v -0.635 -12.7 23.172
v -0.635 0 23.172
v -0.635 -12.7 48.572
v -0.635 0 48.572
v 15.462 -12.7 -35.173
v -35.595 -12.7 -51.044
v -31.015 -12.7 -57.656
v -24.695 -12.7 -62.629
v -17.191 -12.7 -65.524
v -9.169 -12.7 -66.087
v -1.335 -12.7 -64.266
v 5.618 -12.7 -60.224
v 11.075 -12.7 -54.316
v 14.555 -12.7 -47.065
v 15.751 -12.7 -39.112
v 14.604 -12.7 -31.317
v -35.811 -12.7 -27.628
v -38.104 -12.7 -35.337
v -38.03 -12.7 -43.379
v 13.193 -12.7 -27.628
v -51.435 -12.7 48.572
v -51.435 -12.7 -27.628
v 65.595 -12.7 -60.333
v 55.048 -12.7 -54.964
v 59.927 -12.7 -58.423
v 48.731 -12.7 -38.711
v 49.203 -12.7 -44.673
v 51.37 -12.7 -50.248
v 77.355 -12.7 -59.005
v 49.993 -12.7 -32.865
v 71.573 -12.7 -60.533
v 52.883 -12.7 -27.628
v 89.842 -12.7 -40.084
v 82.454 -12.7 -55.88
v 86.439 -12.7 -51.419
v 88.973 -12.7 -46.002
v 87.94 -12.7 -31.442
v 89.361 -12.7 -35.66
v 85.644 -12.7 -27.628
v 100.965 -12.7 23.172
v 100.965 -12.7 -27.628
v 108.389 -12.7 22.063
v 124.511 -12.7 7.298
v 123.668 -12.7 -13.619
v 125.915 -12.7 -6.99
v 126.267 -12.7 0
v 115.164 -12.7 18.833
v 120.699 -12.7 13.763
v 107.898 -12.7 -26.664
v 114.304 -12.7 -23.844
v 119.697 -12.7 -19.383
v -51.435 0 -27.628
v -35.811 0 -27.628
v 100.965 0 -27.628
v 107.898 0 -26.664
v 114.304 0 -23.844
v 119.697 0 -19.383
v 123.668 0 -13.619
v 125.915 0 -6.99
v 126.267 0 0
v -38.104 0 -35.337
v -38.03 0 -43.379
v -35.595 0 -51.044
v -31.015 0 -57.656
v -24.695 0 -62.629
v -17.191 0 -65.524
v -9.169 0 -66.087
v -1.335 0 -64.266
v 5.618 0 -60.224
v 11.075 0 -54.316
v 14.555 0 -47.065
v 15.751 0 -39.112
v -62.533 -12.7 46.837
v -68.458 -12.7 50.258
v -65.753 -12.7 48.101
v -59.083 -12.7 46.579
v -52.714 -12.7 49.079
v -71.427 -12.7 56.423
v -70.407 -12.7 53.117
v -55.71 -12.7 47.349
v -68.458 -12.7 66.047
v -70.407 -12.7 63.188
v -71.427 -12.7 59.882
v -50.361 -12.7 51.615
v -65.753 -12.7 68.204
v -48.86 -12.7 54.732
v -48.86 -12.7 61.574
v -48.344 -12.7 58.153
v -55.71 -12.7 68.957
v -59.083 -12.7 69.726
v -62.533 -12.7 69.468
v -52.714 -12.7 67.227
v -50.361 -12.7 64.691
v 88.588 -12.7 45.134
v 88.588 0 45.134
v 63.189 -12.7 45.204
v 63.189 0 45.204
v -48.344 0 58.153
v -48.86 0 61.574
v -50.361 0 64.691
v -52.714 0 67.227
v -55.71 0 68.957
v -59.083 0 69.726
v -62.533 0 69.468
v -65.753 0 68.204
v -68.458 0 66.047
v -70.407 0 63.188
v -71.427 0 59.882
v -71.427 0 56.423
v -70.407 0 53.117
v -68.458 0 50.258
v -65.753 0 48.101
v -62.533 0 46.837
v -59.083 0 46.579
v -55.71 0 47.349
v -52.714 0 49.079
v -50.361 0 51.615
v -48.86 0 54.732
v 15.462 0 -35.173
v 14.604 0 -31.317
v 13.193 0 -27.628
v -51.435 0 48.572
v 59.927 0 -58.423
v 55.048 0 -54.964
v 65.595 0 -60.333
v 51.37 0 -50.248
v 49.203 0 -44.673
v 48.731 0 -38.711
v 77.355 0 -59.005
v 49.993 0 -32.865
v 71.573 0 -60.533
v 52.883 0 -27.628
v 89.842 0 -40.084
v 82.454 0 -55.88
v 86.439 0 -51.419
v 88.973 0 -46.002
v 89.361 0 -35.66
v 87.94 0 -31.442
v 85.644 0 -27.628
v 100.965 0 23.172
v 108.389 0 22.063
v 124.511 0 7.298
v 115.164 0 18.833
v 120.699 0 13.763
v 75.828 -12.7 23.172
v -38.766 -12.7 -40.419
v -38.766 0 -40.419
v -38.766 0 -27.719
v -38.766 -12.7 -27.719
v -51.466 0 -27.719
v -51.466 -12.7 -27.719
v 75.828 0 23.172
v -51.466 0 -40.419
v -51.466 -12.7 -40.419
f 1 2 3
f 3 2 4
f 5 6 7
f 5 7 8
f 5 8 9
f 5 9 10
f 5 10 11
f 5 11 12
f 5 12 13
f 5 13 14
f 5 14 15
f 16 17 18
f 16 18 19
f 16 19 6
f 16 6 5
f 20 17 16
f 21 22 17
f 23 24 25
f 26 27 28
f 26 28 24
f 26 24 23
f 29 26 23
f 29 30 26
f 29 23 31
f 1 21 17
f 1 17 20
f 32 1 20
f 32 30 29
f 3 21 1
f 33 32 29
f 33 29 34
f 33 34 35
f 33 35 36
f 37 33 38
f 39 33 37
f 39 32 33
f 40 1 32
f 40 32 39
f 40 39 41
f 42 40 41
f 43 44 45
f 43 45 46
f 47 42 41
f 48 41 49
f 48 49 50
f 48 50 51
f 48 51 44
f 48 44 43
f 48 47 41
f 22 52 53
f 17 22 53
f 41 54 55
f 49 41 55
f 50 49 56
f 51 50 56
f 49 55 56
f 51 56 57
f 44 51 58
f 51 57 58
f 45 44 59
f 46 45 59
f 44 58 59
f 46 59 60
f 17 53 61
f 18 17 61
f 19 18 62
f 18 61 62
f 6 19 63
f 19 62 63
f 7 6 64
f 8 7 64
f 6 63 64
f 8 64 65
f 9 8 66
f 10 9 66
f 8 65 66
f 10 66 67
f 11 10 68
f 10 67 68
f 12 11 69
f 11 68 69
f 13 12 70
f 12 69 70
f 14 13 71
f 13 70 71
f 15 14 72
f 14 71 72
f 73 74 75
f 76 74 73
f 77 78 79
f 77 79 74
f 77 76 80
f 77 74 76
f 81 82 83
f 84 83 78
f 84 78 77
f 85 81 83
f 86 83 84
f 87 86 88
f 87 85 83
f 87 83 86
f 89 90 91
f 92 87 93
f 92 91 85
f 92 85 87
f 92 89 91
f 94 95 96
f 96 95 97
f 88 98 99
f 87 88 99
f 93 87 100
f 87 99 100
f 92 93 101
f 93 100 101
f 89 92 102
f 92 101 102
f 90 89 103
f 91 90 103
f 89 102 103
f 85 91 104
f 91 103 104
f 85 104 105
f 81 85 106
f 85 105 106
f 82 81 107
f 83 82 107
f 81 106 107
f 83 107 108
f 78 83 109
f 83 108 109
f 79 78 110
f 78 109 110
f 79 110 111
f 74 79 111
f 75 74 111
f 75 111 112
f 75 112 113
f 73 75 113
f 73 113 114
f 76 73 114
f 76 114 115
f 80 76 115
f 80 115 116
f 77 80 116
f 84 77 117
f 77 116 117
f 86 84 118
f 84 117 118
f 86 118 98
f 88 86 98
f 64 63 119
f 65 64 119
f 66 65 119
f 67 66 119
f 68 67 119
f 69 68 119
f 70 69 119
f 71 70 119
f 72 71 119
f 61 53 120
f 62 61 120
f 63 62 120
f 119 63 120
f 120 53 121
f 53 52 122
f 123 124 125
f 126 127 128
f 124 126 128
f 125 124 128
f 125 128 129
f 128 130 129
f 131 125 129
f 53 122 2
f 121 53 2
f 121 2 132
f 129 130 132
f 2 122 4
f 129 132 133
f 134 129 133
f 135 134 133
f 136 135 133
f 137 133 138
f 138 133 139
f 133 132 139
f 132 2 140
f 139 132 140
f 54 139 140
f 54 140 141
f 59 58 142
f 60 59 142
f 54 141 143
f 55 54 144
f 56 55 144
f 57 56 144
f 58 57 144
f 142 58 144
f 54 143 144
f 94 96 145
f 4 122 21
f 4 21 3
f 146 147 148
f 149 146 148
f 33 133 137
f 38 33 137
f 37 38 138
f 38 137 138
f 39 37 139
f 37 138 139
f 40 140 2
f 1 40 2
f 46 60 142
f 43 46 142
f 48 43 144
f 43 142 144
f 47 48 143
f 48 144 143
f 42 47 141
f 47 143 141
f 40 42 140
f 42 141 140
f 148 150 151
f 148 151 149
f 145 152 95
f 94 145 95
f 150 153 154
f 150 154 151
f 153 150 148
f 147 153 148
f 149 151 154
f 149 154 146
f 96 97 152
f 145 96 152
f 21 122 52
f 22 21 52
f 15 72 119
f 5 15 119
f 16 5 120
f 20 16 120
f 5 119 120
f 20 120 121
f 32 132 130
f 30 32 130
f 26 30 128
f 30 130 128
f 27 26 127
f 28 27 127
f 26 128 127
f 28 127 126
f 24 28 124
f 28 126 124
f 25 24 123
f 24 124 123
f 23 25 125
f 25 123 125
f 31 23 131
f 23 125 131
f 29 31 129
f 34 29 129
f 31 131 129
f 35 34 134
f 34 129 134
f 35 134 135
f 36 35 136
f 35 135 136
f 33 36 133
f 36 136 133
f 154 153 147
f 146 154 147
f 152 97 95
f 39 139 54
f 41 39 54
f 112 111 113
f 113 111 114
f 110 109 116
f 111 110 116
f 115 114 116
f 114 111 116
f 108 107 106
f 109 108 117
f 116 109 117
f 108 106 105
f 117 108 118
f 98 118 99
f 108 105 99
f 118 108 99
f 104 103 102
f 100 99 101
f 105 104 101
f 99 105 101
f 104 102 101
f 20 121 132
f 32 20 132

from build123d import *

# Parameters (mm, degrees)
F1_W     = 50.8
F1_H     = 25.4
F2_DEPTH = 12.7
F1_W_2   = 12.7
F1_H_2   = 12.7
F0_R     = 11.6061953028


with BuildPart() as f2:
    # F1 (on Front) → F2 (new body)
    with BuildSketch(Plane.XZ):
        with Locations((-26.0346938372, 35.8717816622)):
            Rectangle(F1_W, F1_H)
        with BuildLine():
            Line((-0.6346938372, 23.1717816622), (-51.4346938372, 23.1717816622))
            Line((-51.4346938372, 23.1717816622), (-51.4346938372, -27.6282183378))
            Line((-51.4346938372, -27.6282183378), (-35.8106568949, -27.6282183378))
            ThreePointArc((-35.8106568949, -27.6282183378), (-11.3088339567, -12.0524939981), (13.1929889814, -27.6282183378))
            Line((13.1929889814, -27.6282183378), (52.8828968769, -27.6282183378))
            ThreePointArc((52.8828968769, -27.6282183378), (69.2636594176, -19.5055942382), (85.6444219583, -27.6282183378))
            Line((85.6444219583, -27.6282183378), (100.9653061628, -27.6282183378))
            Line((100.9653061628, -27.6282183378), (100.9653061628, 23.1717816622))
            Line((100.9653061628, 23.1717816622), (75.827864427, 23.1717816622))
            Line((75.827864427, 23.1717816622), (-0.6346938372, 23.1717816622))
        make_face()
        with BuildLine():
            ThreePointArc((13.1929889814, -27.6282183378), (-11.3088339567, -12.0524939981), (-35.8106568949, -27.6282183378))
            Line((-35.8106568949, -27.6282183378), (-11.3088339567, -27.6282183378))
            Line((-11.3088339567, -27.6282183378), (13.1929889814, -27.6282183378))
        make_face()
        with BuildLine():
            Line((-11.3088339567, -27.6282183378), (-35.8106568949, -27.6282183378))
            ThreePointArc((-35.8106568949, -27.6282183378), (-17.1914081512, -65.5243298477), (15.7506625268, -39.1119904816))
            ThreePointArc((15.7506625268, -39.1119904816), (15.1035054093, -33.2294162871), (13.1929889814, -27.6282183378))
            Line((13.1929889814, -27.6282183378), (-11.3088339567, -27.6282183378))
        make_face()
        with BuildLine():
            ThreePointArc((126.2673820271, 0), (118.1199448098, 16.5035293887), (100.9653061628, 23.1717816622))
            Line((100.9653061628, 23.1717816622), (100.9653061628, -27.6282183378))
            ThreePointArc((100.9653061628, -27.6282183378), (119.6970538894, -19.3828569848), (126.2673820271, 0))
        make_face()
        with BuildLine():
            ThreePointArc((85.6444219583, -27.6282183378), (69.2636594176, -19.5055942382), (52.8828968769, -27.6282183378))
            Line((52.8828968769, -27.6282183378), (85.6444219583, -27.6282183378))
        make_face()
        with BuildLine():
            Line((85.6444219583, -27.6282183378), (52.8828968769, -27.6282183378))
            ThreePointArc((52.8828968769, -27.6282183378), (62.6914232933, -59.5853239072), (89.8423787807, -40.0843136013))
            ThreePointArc((89.8423787807, -40.0843136013), (88.7646697236, -33.512077477), (85.6444219583, -27.6282183378))
        make_face()
    extrude(amount=F2_DEPTH)


with BuildPart() as f2b:
    # F1 (on Front) → F2, piece 2 (new body)
    with BuildSketch(Plane.XZ):
        Polygon((63.1885279137, 45.2037396438), (75.827864427, 23.1717816622), (88.5884314775, 45.1337471604), align=None)
    extrude(amount=F2_DEPTH)


with BuildPart() as f2c:
    # F1 (on Front) → F2, piece 3 (new body)
    with BuildSketch(Plane.XZ):
        with Locations((-45.11574229, -34.0687217355)):
            Rectangle(F1_W_2, F1_H_2)
    extrude(amount=F2_DEPTH)


with BuildPart() as f2d:
    # F0 (on Front) → F2, piece 4 (new body)
    with BuildSketch(Plane.XZ):
        with Locations((-59.9503405392, 58.1526570022)):
            Circle(F0_R)
    extrude(amount=F2_DEPTH)


solid = Compound([f2.part, f2b.part, f2c.part, f2d.part])
